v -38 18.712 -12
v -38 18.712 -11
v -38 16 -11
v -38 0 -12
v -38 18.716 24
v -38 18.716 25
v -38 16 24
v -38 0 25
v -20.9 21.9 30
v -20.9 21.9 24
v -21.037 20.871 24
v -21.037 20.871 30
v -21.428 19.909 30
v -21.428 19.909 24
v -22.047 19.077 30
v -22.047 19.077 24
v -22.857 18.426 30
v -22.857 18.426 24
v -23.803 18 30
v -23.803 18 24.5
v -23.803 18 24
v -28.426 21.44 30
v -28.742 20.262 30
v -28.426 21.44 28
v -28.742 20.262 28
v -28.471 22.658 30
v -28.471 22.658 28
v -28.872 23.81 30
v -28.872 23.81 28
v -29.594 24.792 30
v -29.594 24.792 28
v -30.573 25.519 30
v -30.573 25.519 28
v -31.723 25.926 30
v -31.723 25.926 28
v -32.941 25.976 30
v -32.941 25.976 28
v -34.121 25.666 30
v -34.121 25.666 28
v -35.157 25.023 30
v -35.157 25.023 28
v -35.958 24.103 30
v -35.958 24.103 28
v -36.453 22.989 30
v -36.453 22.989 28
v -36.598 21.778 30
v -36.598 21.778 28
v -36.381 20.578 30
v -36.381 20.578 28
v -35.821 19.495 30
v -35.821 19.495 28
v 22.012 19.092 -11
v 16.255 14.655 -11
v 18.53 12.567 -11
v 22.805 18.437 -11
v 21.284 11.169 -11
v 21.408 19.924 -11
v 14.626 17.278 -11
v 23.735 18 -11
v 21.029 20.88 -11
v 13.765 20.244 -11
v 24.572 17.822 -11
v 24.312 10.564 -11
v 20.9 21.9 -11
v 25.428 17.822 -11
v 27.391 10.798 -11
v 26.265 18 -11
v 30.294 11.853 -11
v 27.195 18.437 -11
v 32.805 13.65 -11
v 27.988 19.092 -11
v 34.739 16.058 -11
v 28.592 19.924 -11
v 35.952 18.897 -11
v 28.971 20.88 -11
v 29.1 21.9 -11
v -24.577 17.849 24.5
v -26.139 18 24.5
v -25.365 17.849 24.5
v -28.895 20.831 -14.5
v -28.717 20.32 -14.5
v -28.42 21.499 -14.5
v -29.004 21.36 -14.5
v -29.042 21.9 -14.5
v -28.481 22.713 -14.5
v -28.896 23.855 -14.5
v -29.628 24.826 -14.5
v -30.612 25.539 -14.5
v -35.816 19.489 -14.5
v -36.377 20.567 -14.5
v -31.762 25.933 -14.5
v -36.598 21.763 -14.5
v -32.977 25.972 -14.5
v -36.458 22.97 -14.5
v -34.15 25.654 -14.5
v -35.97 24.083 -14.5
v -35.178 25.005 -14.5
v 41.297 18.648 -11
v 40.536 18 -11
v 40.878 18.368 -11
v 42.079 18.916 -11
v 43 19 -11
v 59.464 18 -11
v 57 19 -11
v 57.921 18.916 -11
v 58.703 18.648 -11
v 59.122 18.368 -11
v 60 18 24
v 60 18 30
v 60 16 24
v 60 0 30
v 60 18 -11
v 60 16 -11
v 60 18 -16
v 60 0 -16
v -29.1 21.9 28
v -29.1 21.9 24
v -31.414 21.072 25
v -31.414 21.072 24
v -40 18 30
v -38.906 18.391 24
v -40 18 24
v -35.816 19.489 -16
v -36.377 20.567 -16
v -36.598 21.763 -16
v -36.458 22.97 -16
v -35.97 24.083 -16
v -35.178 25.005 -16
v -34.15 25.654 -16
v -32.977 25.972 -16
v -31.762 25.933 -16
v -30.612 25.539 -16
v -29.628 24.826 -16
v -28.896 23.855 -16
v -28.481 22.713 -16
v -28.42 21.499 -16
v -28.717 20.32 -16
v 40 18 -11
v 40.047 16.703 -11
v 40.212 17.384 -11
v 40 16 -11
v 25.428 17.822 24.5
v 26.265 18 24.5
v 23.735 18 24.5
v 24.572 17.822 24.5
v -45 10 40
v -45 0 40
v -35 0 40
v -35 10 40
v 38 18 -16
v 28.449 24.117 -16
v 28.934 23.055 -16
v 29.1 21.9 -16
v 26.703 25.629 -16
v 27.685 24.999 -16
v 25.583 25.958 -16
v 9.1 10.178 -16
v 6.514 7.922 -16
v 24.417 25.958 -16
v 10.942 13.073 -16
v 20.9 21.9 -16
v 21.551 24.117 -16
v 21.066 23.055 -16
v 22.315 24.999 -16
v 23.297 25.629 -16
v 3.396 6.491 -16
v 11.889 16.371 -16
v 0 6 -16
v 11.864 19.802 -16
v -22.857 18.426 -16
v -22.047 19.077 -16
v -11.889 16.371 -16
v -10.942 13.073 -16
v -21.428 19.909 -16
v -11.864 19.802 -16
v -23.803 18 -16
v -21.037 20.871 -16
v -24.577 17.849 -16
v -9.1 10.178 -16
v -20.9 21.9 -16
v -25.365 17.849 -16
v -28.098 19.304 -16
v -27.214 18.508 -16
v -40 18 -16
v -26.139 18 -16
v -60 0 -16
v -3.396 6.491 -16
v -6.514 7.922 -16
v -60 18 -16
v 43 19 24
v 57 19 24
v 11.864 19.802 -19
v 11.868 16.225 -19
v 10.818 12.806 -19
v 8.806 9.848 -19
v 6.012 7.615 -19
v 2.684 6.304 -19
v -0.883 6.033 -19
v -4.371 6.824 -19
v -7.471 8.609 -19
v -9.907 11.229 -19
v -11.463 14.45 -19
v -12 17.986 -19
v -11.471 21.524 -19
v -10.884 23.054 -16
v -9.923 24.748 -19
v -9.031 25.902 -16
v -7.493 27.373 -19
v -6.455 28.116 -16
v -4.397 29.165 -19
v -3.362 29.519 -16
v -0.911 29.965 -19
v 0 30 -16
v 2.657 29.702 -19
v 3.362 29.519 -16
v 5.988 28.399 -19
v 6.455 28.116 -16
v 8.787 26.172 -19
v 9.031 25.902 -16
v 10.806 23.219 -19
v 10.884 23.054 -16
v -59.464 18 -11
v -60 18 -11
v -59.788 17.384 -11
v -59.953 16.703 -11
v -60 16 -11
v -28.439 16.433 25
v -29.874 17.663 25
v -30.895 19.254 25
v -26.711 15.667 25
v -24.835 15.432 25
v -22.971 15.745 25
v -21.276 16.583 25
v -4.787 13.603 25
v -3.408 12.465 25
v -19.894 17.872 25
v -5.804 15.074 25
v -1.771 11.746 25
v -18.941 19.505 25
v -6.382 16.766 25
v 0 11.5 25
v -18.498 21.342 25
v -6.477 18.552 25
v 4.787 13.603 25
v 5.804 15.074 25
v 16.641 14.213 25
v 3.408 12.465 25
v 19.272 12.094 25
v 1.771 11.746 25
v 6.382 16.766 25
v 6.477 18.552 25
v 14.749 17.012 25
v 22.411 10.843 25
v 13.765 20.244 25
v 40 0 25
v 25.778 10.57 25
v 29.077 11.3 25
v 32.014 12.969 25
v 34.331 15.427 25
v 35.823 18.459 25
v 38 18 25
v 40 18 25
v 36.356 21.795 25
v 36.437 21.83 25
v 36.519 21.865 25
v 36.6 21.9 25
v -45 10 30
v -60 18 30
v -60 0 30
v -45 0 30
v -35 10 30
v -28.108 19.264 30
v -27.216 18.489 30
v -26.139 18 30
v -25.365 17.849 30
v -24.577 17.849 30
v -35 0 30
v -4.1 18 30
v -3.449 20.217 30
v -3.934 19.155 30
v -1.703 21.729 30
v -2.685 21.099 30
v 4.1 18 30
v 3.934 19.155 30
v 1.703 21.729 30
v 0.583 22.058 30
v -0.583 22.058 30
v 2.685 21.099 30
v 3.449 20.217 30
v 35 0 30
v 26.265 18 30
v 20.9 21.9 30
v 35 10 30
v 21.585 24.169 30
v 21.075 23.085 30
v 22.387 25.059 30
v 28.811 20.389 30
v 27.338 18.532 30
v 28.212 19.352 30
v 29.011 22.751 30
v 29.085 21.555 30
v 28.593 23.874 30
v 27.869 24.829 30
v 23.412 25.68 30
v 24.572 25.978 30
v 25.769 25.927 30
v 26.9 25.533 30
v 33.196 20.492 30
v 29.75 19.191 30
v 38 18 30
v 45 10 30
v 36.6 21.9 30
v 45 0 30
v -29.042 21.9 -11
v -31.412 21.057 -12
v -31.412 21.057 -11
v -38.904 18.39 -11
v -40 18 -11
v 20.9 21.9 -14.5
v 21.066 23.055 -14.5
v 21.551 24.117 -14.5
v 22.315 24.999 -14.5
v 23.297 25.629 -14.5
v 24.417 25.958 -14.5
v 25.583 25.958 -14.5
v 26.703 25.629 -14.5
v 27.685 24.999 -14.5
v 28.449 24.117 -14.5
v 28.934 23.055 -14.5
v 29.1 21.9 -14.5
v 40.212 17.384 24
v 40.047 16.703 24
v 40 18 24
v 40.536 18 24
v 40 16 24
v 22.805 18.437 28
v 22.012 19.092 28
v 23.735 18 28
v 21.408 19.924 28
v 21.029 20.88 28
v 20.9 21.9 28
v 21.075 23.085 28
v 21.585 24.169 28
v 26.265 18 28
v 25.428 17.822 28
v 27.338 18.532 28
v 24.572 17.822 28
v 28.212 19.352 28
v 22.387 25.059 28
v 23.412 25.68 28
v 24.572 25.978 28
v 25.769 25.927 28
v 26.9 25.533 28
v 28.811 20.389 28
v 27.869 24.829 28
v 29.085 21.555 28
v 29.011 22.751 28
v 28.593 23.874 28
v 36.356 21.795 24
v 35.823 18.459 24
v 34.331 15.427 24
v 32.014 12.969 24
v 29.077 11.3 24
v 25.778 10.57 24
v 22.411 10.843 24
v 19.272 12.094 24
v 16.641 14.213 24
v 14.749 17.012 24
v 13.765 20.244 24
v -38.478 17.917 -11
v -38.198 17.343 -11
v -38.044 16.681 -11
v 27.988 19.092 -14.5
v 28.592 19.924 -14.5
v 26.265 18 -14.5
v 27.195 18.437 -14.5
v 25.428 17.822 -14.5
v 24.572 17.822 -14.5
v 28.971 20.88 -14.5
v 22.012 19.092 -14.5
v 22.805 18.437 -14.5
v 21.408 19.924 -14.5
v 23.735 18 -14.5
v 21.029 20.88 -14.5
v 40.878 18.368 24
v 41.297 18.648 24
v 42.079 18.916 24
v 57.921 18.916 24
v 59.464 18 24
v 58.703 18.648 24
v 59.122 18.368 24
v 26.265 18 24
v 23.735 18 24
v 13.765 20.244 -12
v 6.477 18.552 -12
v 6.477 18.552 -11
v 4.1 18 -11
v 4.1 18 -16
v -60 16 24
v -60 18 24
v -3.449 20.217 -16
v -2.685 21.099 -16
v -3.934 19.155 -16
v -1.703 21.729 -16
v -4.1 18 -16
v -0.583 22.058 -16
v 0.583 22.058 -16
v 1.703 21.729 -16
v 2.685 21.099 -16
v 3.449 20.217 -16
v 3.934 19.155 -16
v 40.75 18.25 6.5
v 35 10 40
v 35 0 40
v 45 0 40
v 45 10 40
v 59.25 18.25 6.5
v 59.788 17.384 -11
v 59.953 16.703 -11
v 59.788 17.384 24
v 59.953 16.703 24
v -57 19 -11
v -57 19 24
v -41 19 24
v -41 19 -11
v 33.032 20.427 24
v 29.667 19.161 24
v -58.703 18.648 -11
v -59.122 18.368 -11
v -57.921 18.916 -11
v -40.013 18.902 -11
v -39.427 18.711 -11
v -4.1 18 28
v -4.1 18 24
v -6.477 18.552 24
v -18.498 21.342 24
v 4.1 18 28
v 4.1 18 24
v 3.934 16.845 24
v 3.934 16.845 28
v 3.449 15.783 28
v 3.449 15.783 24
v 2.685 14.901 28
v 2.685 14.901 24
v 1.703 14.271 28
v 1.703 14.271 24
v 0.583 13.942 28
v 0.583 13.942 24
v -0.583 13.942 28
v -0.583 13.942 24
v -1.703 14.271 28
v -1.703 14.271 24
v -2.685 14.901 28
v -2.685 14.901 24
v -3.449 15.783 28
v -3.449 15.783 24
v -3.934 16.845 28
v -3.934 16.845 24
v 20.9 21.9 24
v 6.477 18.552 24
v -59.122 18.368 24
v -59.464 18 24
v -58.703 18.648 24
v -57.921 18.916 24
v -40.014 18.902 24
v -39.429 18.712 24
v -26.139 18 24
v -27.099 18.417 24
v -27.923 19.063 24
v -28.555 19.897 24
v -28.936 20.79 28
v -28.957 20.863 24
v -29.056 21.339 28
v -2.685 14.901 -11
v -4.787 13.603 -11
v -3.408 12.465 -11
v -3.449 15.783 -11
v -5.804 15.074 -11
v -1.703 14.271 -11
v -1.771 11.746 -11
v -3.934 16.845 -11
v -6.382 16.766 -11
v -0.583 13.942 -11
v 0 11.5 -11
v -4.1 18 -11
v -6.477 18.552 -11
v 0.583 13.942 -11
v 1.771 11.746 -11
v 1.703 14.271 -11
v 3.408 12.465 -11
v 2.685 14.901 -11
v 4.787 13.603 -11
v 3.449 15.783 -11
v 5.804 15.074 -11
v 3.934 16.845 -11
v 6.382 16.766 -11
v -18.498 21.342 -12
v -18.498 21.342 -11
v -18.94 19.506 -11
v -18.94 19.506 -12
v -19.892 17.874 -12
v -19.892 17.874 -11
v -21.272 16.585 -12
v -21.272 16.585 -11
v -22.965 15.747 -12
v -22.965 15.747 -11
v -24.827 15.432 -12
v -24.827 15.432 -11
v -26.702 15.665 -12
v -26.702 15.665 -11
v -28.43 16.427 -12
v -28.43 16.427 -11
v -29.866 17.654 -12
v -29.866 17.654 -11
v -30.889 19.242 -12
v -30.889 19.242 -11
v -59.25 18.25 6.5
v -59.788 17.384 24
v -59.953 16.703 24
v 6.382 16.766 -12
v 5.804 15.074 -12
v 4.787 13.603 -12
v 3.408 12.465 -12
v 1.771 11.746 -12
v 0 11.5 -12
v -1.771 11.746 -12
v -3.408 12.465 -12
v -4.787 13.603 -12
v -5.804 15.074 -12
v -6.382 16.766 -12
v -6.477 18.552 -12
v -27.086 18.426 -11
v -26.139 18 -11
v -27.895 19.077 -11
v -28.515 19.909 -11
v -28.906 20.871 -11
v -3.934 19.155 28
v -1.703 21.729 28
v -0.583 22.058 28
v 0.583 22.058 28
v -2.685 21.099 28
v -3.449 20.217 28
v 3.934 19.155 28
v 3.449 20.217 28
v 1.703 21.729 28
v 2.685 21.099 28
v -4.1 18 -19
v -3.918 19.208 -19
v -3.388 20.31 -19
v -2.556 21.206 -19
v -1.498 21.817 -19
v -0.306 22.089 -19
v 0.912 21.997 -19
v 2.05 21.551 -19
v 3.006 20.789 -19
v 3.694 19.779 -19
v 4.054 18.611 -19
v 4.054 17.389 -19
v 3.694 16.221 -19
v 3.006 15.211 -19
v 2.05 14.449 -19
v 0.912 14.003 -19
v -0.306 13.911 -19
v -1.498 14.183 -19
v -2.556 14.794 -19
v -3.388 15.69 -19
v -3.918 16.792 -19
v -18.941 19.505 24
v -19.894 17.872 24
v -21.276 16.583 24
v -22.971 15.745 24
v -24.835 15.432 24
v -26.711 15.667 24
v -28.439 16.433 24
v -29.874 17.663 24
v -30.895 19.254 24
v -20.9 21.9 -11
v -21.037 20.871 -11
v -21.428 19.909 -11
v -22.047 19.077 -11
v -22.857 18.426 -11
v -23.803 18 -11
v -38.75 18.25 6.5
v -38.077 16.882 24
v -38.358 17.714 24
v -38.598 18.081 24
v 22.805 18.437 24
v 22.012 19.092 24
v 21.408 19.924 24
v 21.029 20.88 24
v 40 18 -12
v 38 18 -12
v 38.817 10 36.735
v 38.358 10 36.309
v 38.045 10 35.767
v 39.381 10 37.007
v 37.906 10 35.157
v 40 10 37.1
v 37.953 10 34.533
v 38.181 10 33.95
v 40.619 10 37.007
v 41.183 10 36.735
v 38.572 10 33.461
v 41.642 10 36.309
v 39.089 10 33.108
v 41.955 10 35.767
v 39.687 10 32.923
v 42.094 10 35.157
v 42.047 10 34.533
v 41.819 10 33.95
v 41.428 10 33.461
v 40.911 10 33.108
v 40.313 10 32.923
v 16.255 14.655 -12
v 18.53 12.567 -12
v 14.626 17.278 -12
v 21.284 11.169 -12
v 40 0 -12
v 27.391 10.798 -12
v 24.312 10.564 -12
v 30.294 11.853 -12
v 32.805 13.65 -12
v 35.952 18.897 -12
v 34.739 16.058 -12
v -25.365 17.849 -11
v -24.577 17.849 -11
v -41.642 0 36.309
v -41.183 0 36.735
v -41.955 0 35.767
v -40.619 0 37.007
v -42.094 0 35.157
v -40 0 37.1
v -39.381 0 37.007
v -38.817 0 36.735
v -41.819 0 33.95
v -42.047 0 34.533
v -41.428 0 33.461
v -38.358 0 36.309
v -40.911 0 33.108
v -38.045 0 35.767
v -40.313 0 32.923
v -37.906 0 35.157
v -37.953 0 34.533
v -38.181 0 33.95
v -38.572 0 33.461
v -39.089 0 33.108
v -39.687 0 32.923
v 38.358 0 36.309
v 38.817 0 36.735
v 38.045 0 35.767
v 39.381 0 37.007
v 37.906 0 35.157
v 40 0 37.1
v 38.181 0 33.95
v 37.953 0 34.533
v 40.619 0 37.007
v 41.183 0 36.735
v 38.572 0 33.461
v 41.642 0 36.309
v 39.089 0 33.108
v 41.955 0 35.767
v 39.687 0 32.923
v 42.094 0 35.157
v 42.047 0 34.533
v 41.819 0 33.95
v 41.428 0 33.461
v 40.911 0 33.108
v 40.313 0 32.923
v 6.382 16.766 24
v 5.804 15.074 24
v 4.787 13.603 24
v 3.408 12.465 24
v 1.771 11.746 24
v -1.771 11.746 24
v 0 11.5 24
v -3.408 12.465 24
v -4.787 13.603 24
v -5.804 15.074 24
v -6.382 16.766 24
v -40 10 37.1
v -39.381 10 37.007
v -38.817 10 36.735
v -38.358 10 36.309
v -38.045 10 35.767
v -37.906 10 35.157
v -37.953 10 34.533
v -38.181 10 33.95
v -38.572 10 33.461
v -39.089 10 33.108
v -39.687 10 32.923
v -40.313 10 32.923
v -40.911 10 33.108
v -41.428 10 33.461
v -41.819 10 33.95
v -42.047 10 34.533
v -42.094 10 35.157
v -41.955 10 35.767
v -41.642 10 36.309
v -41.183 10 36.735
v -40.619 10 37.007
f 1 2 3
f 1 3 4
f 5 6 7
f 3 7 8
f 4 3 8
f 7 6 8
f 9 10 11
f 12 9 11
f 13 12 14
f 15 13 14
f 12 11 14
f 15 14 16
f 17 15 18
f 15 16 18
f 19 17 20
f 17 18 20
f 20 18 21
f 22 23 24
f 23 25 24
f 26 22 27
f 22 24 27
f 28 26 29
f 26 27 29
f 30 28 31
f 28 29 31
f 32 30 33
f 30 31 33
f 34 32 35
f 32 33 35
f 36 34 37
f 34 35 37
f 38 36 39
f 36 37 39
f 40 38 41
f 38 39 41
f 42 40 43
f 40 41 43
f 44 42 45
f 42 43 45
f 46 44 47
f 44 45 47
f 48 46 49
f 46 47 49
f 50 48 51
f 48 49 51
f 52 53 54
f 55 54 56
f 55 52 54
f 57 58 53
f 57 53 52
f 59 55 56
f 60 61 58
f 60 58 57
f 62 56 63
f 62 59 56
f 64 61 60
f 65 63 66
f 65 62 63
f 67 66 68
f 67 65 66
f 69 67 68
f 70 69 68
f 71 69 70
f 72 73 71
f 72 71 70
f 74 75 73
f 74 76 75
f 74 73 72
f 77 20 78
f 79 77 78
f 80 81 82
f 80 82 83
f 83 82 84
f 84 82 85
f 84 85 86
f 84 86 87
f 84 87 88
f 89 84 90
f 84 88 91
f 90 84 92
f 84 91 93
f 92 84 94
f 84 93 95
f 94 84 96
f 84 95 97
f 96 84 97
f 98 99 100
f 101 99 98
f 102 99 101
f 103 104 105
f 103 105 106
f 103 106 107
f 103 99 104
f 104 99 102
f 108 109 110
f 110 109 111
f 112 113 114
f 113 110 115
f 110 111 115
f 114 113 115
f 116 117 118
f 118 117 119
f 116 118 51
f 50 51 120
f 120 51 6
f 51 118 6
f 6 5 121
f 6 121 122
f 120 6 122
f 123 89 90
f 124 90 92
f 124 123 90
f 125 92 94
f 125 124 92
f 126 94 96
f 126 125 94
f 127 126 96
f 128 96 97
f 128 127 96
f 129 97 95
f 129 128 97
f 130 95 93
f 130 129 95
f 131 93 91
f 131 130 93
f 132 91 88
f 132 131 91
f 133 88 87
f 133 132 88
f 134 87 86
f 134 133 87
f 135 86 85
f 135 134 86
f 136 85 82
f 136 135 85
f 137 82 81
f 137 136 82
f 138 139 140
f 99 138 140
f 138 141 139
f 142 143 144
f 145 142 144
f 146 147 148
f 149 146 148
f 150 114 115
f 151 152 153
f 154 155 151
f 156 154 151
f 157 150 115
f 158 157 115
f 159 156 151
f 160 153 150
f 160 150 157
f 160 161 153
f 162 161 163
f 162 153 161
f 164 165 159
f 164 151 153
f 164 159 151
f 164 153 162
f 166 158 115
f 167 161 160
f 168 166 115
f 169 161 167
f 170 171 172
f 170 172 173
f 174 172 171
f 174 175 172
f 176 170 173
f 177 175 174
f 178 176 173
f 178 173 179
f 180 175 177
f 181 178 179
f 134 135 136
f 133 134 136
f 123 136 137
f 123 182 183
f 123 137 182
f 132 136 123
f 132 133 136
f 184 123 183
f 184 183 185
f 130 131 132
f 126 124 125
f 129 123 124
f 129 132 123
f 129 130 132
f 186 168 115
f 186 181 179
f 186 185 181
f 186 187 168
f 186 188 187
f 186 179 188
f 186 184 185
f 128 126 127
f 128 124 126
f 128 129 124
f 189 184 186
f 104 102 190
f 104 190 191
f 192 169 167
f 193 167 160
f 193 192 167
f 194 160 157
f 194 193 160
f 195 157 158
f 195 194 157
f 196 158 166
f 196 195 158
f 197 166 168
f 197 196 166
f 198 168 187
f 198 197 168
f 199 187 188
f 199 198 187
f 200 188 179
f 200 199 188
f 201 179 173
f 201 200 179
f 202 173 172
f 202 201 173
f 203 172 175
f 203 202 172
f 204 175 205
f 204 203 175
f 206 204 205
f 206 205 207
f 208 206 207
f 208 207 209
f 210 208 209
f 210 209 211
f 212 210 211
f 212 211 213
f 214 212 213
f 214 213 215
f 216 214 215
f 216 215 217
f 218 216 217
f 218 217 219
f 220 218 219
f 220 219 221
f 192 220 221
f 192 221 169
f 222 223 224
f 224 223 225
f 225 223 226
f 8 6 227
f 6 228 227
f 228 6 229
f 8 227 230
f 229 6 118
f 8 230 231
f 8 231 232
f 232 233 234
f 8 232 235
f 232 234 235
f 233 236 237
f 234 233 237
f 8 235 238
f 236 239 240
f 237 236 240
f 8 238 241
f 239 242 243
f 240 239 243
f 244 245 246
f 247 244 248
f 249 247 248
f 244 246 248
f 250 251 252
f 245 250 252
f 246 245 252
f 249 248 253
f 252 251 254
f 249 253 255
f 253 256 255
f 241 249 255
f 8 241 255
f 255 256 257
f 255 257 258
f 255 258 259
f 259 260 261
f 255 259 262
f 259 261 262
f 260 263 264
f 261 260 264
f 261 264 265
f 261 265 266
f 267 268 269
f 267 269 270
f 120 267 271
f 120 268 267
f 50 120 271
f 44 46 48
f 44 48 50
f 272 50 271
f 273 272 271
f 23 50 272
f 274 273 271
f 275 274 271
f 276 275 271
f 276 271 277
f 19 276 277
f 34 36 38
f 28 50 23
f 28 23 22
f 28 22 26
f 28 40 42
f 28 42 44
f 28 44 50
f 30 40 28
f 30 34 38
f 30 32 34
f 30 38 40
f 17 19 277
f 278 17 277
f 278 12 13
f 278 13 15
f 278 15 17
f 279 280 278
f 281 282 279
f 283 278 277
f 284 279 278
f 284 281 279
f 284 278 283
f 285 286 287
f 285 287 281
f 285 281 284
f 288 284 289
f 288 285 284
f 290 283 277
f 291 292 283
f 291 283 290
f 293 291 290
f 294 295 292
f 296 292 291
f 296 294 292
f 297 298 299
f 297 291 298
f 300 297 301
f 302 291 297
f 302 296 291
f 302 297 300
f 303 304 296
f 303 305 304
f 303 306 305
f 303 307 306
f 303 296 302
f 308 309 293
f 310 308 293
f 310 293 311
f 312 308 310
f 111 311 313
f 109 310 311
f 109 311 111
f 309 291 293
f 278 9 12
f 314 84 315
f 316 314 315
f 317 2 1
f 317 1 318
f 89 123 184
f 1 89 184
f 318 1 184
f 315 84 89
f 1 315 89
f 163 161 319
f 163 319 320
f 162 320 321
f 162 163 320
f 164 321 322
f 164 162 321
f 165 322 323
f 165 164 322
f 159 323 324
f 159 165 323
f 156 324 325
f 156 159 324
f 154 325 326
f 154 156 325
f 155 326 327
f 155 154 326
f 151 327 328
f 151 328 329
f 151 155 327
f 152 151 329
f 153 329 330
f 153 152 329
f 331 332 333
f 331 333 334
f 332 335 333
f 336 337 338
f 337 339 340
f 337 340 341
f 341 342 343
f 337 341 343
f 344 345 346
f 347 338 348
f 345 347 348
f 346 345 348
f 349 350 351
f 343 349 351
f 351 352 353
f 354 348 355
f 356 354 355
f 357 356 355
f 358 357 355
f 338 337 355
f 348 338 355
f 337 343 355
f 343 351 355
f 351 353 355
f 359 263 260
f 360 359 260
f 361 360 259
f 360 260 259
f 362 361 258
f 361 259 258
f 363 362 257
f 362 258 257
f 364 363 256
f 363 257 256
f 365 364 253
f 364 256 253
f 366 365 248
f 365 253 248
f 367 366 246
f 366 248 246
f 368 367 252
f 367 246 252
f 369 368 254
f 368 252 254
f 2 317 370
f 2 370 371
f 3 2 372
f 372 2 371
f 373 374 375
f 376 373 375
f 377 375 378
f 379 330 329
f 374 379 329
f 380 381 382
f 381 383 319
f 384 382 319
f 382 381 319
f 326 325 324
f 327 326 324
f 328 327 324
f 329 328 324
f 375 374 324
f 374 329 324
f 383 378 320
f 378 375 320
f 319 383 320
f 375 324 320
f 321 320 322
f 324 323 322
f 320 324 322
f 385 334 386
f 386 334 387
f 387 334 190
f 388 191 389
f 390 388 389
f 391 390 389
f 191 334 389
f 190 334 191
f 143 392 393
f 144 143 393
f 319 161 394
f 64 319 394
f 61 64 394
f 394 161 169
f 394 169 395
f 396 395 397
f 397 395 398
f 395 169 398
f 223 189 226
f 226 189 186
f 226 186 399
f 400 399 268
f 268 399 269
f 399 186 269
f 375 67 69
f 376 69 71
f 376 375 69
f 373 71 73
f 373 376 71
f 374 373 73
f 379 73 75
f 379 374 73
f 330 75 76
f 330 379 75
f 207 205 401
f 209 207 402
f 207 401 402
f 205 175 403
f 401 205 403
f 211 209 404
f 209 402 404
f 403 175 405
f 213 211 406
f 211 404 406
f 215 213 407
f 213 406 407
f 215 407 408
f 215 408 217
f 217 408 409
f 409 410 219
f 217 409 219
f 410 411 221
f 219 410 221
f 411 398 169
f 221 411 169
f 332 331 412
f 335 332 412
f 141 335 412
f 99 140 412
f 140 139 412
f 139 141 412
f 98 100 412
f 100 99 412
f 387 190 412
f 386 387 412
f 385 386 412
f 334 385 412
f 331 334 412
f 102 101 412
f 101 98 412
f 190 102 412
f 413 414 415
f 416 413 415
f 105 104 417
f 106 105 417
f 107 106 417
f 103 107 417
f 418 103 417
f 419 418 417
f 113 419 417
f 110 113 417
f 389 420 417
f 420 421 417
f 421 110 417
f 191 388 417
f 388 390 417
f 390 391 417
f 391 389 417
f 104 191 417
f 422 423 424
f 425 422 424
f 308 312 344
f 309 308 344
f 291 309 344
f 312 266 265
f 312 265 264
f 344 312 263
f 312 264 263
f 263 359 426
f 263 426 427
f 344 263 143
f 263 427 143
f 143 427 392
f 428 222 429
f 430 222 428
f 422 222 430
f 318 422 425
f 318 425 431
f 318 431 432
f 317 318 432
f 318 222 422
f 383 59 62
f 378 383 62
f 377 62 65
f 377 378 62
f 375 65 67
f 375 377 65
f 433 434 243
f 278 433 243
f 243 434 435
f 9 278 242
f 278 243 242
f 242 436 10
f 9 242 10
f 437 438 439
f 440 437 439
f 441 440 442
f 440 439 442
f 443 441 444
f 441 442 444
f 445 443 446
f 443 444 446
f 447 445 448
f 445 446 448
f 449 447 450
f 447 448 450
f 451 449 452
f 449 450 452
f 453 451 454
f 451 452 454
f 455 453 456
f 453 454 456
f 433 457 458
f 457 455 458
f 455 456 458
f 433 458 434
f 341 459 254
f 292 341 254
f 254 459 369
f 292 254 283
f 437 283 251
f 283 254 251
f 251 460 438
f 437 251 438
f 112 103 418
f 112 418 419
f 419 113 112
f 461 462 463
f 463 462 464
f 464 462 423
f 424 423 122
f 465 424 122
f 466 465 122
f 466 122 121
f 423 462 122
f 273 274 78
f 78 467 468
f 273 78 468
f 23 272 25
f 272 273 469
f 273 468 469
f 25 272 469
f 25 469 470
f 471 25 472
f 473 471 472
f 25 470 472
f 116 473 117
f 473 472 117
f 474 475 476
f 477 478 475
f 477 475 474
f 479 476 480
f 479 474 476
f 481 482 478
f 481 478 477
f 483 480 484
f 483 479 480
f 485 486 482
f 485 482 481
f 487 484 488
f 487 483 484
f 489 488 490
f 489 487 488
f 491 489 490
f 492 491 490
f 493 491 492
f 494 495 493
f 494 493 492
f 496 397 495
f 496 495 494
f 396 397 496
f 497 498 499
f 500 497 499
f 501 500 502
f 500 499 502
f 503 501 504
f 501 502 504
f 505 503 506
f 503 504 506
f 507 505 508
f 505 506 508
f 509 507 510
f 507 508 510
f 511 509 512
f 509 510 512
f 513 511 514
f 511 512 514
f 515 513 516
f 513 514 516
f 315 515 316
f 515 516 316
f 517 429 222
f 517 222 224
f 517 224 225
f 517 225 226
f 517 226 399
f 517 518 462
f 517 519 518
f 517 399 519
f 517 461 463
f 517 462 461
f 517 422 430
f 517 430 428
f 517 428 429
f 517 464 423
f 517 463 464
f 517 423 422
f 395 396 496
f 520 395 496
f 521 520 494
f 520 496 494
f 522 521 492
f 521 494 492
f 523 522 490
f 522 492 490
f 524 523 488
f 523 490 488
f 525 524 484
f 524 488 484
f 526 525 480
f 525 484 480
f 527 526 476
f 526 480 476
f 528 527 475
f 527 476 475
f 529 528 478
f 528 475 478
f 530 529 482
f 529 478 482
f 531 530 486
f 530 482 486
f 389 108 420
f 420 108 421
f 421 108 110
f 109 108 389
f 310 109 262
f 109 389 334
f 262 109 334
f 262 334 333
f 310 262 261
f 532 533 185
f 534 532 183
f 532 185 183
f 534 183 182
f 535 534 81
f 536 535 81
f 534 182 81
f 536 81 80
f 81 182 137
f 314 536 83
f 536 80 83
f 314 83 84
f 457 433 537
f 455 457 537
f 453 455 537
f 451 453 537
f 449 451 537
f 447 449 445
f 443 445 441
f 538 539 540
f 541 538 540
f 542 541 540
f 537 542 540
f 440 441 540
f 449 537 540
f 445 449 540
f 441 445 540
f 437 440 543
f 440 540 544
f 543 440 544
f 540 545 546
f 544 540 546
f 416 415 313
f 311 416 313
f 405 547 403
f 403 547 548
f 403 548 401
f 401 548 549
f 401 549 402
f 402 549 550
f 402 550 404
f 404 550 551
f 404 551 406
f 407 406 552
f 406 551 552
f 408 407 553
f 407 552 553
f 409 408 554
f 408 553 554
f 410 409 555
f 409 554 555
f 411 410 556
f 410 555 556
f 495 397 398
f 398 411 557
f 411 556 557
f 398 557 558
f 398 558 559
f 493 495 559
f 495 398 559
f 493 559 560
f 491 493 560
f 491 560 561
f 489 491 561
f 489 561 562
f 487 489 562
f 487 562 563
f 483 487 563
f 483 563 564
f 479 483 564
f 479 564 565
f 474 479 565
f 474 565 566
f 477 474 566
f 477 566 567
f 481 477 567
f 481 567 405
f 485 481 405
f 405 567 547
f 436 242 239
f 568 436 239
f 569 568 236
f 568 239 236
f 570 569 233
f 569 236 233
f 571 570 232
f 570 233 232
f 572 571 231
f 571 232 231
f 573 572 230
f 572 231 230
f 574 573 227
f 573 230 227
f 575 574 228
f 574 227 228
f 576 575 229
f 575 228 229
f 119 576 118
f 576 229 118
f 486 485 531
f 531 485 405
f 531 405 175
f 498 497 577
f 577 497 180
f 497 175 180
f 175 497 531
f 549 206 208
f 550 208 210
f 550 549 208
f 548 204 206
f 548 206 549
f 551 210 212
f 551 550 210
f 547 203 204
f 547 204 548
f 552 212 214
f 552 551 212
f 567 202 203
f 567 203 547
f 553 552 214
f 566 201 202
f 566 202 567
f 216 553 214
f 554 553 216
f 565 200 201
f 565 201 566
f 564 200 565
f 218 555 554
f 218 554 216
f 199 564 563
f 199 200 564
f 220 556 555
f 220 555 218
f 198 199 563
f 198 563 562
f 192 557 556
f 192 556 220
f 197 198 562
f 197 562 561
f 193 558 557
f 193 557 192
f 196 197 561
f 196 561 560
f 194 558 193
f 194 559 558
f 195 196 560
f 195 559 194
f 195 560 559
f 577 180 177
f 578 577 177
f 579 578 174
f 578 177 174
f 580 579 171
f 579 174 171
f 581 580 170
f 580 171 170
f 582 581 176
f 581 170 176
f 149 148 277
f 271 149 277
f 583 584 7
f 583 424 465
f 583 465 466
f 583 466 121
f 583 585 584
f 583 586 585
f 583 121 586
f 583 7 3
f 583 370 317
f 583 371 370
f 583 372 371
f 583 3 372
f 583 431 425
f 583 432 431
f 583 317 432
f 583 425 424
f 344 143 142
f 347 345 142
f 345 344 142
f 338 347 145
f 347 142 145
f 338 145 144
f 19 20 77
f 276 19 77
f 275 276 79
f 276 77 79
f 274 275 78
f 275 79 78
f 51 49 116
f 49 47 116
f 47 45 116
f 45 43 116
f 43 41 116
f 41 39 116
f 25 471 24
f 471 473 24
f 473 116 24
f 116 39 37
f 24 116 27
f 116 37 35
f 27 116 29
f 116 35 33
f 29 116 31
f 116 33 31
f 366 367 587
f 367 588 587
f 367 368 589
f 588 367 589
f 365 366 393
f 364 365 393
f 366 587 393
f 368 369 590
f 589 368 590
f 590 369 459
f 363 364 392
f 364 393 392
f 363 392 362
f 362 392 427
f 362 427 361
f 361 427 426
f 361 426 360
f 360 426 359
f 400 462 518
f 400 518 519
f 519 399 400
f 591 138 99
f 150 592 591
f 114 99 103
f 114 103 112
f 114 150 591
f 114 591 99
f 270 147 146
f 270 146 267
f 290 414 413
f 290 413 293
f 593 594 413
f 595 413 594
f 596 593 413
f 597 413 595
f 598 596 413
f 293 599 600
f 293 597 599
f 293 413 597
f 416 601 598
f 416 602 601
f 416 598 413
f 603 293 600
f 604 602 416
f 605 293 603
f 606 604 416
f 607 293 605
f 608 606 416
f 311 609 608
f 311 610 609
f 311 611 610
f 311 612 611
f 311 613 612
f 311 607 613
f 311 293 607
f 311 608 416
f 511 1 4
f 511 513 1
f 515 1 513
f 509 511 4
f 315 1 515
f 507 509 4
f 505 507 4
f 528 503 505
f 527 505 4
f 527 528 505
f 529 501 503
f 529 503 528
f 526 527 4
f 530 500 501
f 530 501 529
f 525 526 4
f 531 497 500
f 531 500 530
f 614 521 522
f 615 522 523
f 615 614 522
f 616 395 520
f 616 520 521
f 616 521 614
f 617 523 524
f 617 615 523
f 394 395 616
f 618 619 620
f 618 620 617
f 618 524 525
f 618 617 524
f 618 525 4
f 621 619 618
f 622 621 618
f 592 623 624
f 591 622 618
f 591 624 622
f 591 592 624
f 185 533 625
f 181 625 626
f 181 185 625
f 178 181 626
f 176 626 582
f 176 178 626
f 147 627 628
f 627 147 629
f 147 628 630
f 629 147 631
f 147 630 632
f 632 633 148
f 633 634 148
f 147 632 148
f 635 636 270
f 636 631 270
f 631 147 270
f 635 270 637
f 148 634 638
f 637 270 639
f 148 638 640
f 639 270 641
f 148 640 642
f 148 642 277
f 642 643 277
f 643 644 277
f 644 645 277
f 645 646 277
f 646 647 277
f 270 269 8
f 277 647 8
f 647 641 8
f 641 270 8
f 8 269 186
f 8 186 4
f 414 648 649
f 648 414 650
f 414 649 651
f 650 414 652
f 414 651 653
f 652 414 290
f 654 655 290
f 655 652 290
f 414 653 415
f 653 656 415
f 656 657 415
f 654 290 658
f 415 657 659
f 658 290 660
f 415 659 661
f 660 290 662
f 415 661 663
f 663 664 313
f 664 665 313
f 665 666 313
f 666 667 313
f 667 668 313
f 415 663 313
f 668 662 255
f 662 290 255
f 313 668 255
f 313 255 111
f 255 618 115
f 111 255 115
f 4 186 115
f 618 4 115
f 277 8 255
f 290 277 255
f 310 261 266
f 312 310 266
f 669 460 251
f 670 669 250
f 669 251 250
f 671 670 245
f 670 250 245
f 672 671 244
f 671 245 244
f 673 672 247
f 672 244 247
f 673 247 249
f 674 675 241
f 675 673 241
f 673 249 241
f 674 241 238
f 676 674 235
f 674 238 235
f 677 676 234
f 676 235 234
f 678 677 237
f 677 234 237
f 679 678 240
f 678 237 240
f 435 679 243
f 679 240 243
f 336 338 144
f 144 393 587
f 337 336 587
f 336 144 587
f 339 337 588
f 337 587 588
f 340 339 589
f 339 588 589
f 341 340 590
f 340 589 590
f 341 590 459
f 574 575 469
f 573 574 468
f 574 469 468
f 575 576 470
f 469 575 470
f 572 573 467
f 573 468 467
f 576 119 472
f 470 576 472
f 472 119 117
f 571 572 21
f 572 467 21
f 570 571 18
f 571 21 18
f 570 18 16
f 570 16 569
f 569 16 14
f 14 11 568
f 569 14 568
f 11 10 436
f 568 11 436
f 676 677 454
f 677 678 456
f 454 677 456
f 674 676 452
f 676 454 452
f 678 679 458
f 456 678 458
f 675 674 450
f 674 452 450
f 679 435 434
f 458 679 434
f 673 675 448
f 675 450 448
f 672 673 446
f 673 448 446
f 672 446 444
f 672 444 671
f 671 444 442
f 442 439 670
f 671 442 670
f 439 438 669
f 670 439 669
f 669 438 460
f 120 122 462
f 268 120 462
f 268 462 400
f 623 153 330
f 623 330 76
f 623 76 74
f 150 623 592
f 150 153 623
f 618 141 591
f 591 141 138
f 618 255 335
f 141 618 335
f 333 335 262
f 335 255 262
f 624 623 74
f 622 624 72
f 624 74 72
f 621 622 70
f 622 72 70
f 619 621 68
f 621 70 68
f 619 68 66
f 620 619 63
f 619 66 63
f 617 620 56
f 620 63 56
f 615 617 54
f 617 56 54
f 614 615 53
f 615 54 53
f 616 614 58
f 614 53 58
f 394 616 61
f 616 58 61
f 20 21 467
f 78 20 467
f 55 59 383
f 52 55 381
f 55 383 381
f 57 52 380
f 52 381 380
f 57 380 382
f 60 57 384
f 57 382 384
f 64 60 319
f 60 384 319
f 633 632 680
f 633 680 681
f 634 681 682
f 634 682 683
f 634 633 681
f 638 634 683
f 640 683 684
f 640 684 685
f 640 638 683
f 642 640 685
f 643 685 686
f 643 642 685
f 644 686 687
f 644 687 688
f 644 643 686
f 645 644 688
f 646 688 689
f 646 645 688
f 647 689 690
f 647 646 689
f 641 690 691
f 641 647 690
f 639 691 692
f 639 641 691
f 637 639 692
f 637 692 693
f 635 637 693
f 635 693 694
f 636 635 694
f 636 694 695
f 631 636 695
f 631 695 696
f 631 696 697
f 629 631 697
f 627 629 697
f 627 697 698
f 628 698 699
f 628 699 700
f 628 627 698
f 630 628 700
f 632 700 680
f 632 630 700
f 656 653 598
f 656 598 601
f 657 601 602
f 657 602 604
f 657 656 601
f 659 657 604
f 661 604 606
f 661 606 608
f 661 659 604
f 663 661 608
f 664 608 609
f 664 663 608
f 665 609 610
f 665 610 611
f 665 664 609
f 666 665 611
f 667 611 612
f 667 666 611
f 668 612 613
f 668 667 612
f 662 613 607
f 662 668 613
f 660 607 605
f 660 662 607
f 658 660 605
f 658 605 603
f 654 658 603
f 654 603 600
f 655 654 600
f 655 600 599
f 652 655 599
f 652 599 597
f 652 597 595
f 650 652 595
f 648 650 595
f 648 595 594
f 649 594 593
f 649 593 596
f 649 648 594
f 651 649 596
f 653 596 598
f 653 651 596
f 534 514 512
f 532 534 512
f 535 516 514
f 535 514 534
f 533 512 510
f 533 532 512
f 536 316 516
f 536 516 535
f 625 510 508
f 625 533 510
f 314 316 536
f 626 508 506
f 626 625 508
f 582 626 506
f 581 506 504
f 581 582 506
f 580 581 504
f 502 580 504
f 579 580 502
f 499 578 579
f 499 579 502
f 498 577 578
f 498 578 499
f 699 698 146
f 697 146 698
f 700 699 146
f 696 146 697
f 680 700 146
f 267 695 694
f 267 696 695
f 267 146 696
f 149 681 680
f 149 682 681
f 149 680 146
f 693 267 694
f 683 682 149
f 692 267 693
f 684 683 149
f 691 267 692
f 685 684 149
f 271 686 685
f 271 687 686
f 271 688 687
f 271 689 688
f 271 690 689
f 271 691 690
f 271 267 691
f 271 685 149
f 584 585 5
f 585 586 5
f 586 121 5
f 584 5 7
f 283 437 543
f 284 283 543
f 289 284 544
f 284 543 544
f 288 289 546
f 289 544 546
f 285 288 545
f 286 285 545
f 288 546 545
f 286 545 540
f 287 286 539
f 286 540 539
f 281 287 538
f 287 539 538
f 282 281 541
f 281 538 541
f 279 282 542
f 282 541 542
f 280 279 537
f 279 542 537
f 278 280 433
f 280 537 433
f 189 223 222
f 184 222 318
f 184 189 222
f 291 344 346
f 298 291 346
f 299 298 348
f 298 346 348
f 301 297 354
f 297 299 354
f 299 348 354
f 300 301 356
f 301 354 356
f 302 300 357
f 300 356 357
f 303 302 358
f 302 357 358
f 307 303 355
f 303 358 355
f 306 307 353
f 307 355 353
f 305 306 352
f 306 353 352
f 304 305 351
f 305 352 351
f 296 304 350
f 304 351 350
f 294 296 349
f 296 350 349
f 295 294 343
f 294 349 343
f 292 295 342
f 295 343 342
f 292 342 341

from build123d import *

# Parameters (mm, degrees)
SKETCH_1_5_W             = 10
SKETCH_1_5_H             = 10
SKETCH_1_5_R             = 2.1
EXTRUDE_4_DEPTH          = 10
EXTRUDE_4_2_DEPTH        = 10
SKETCH_1_6_W             = 10
SKETCH_1_6_H             = 10
SKETCH_1_6_R             = 2.1
EXTRUDE_5_DEPTH          = 35
SKETCH_1_W               = 20
SKETCH_1_H               = 35
EXTRUDE_7_DEPTH          = 19
SKETCH_1_W_2             = 22
EXTRUDE_7_2_DEPTH        = 19
FILLET_8_SIZE            = 3
FILLET_9_SIZE            = 3
EXTRUDE_8_DEPTH          = 18
SKETCH_2_W               = 37
SKETCH_2_H               = 30
CUT_EXTRUDE_2_DEPTH      = 138.800580637
CUT_EXTRUDE_3_DEPTH      = 113.111551644
CUT_EXTRUDE_3_DEPTH_BACK = 113.111551644
CUT_EXTRUDE_4_DEPTH      = 6
CUT_EXTRUDE_START        = -5.5
CUT_EXTRUDE_5_DEPTH      = 5.5
EXTRUDE_START            = 24
EXTRUDE_14_DEPTH         = 6
EXTRUDE_15_DEPTH         = 5
CUT_EXTRUDE_6_DEPTH      = 138.800580637
CUT_EXTRUDE_6_DEPTH_BACK = 138.800580637
EXTRUDE_START_2          = -2
SKETCH_10_R              = 4.1
EXTRUDE_17_DEPTH         = 2
SKETCH_11_R              = 4.1
EXTRUDE_18_DEPTH         = 1.5
EXTRUDE_19_DEPTH         = 6
CUT_EXTRUDE_7_DEPTH      = 36
CUT_EXTRUDE_7_DEPTH_BACK = 1
EXTRUDE_START_3          = 3
SKETCH_13_R              = 12
SKETCH_13_R_2            = 4.1
EXTRUDE_20_DEPTH         = 3
CUT_EXTRUDE_9_DEPTH      = 40


with BuildPart() as part:
    # Эскиз1<5> → Бобышка-Вытянуть4 (new body)
    with BuildSketch(Plane(origin=(0, 0, 0), x_dir=(1, 0, 0), z_dir=(0, 1, 0))):
        with Locations((-40, -35)):
            Rectangle(SKETCH_1_5_W, SKETCH_1_5_H)
        with Locations(Location((-40, -35, 0), (0, 0, 270))):
            Circle(SKETCH_1_5_R, mode=Mode.SUBTRACT)
    extrude(amount=EXTRUDE_4_DEPTH)



with BuildPart() as body_2:
    # Эскиз1<5> → Extrude 4 2 (new body)
    with BuildSketch(Plane(origin=(0, 0, 0), x_dir=(1, 0, 0), z_dir=(0, 1, 0))):
        with Locations((40, -35)):
            Rectangle(SKETCH_1_5_W, SKETCH_1_5_H)
        with Locations(Location((40, -35, 0), (0, 0, 270))):
            Circle(SKETCH_1_5_R, mode=Mode.SUBTRACT)
    extrude(amount=EXTRUDE_4_2_DEPTH)


with BuildPart() as body_3:
    # Эскиз1<6> → Бобышка-Вытянуть5 (new body)
    # profile 1 of 3: a face of its own
    with BuildSketch(Plane(origin=(0, 0, 0), x_dir=(1, 0, 0), z_dir=(0, 1, 0))):
        Polygon((45, 48), (35, 48), (-35, 48), (-45, 48), (-60, 48), (-60, 43), (-60, 16), (-55, 16), (-55, 43), (55, 43), (55, 16), (60, 16), (60, 43), (60, 48), align=None)
    # profile 2 of 3: a face of its own
    with BuildSketch(Plane(origin=(0, 0, 0), x_dir=(1, 0, 0), z_dir=(0, 1, 0))):
        with Locations((-40, 53)):
            Rectangle(SKETCH_1_6_W, SKETCH_1_6_H)
        with Locations(Location((-40, 53, 0), (0, 0, 270))):
            Circle(SKETCH_1_6_R, mode=Mode.SUBTRACT)
    # profile 3 of 3: a face of its own
    with BuildSketch(Plane(origin=(0, 0, 0), x_dir=(1, 0, 0), z_dir=(0, 1, 0))):
        with Locations((40, 53)):
            Rectangle(SKETCH_1_6_W, SKETCH_1_6_H)
        with Locations(Location((40, 53, 0), (0, 0, 270))):
            Circle(SKETCH_1_6_R, mode=Mode.SUBTRACT)
    extrude(amount=EXTRUDE_5_DEPTH)


with BuildPart() as body_4:
    # Эскиз1 → Бобышка-Вытянуть7 (new body)
    with BuildSketch(Plane(origin=(0, 0, 0), x_dir=(1, 0, 0), z_dir=(0, 1, 0))):
        with Locations((50, -6.5)):
            Rectangle(SKETCH_1_W, SKETCH_1_H)
    extrude(amount=EXTRUDE_7_DEPTH)

    # Скругление9
    # a fillet whose section is not a circle: 3 mm, written as the material it takes off along each edge
    with BuildSketch(Plane(origin=(40, 19, 31.5), x_dir=(0, -1, 0), z_dir=(0, 0, -1)), Plane(origin=(60, 19, -18.5), x_dir=(0, -1, 0), z_dir=(0, 0, 1))) as fillet_9_piece_1:
        with BuildLine():
            Bezier((FILLET_9_SIZE, 0), (0, 0), (0, -FILLET_9_SIZE), weights=[1, 1, 1])
            Line((0, -FILLET_9_SIZE), (0, 0))
            Line((0, 0), (FILLET_9_SIZE, 0))
        make_face()
    extrude(amount=50, mode=Mode.SUBTRACT)


with BuildPart() as body_5:
    # Эскиз1 → Extrude 7 2 (new body)
    with BuildSketch(Plane(origin=(0, 0, 0), x_dir=(1, 0, 0), z_dir=(0, 1, 0))):
        with Locations((-49, -6.5)):
            Rectangle(SKETCH_1_W_2, SKETCH_1_H)
    extrude(amount=EXTRUDE_7_2_DEPTH)

    # Скругление8
    # a fillet whose section is not a circle: 3 mm, written as the material it takes off along each edge
    with BuildSketch(Plane(origin=(-60, 19, -18.5), x_dir=(0, -1, 0), z_dir=(0, 0, 1)), Plane(origin=(-38, 19, 31.5), x_dir=(0, -1, 0), z_dir=(0, 0, -1))) as fillet_8_piece_1:
        with BuildLine():
            Bezier((FILLET_8_SIZE, 0), (0, 0), (0, FILLET_8_SIZE), weights=[1, 1, 1])
            Line((0, FILLET_8_SIZE), (0, 0))
            Line((0, 0), (FILLET_8_SIZE, 0))
        make_face()
    extrude(amount=50, mode=Mode.SUBTRACT)


with BuildPart() as part_1:
    add(part.part)

    add(body_2.part)  # Бобышка-Вытянуть8 merges body 2

    add(body_3.part)  # Бобышка-Вытянуть8 merges body 3

    add(body_4.part)  # Бобышка-Вытянуть8 merges body 4

    add(body_5.part)  # Бобышка-Вытянуть8 merges body 5
    # Эскиз1<9> → Бобышка-Вытянуть8 (add)
    with BuildSketch(Plane(origin=(0, 0, 0), x_dir=(1, 0, 0), z_dir=(0, 1, 0))):
        Polygon((-38, 11), (40, 11), (60, 11), (60, 16), (55, 16), (-55, 16), (-60, 16), (-60, 11), align=None)
        Polygon((40, -24), (60, -24), (60, -30), (45, -30), (35, -30), (-35, -30), (-45, -30), (-60, -30), (-60, -24), (-38, -24), align=None)
    extrude(amount=EXTRUDE_8_DEPTH)

    # Эскиз2 → Вырез-Вытянуть2 (cut, through all)
    with BuildSketch(Plane.ZY.offset(60)):
        with Locations((-39.5, 15)):
            Rectangle(SKETCH_2_W, SKETCH_2_H)
    extrude(amount=-CUT_EXTRUDE_2_DEPTH, mode=Mode.SUBTRACT)

    # Эскиз3 → Вырез-Вытянуть3 (cut, two sides: drawn at the far end of the back side and taken through both)
    with BuildSketch(Plane.XY.offset(30).offset(-CUT_EXTRUDE_3_DEPTH_BACK)):
        with BuildLine():
            Line((-4.1, 18), (4.1, 18))
            ThreePointArc((4.1, 18), (0, 13.9), (-4.1, 18))
        make_face()
    extrude(amount=CUT_EXTRUDE_3_DEPTH + CUT_EXTRUDE_3_DEPTH_BACK, mode=Mode.SUBTRACT)

    # Эскиз6 → Вырез-Вытянуть4 (cut)
    with BuildSketch(Plane(origin=(0, 0, -16), x_dir=(-1, 0, 0), z_dir=(0, 0, -1))):
        with BuildLine():
            Line((-26.264911064, 18), (-23.735088936, 18))
            ThreePointArc((-23.735088936, 18), (-25, 17.8), (-26.264911064, 18))
        make_face()
        with BuildLine():
            Line((23.803098267, 18), (26.13923016, 18))
            ThreePointArc((26.13923016, 18), (24.971164214, 17.830091849), (23.803098267, 18))
        make_face()
    extrude(amount=-CUT_EXTRUDE_4_DEPTH, mode=Mode.SUBTRACT)

    # Эскиз7 → Вырез-Вытянуть5 (cut)
    with BuildSketch(Plane.XY.offset(30).offset(CUT_EXTRUDE_START)):
        with BuildLine():
            Line((-26.13923016, 18), (-23.803098267, 18))
            ThreePointArc((-23.803098267, 18), (-24.971164214, 17.830091849), (-26.13923016, 18))
        make_face()
        with BuildLine():
            Line((23.735088936, 18), (26.264911064, 18))
            ThreePointArc((26.264911064, 18), (25, 17.8), (23.735088936, 18))
        make_face()
    extrude(amount=CUT_EXTRUDE_5_DEPTH, mode=Mode.SUBTRACT)

    # Бобышка-Вытянуть14: read off the stored shape, not the designer's step
    # Бобышка-Вытянуть14 outline → Бобышка-Вытянуть14 (add)
    with BuildSketch(Plane.XY.offset(EXTRUDE_START)):
        with BuildLine():
            ThreePointArc((23.735088935, 18), (21.68366653, 19.489205044), (20.9, 21.9))
            Line((20.9, 21.9), (4.1, 18))
            Line((4.1, 18), (23.735088935, 18))
        make_face()
        with BuildLine():
            ThreePointArc((-20.9, 21.9), (-21.711099928, 19.473259749), (-23.803098267, 18))
            Line((-23.803098267, 18), (-4.1, 18))
            Line((-4.1, 18), (-20.9, 21.9))
        make_face()
        with BuildLine():
            ThreePointArc((-26.13923016, 18), (-28.265749222, 19.45947321), (-29.1, 21.9))
            Line((-29.1, 21.9), (-40, 18))
            Line((-40, 18), (-26.13923016, 18))
        make_face()
    extrude(amount=EXTRUDE_14_DEPTH)

    # Эскиз6<6> → Бобышка-Вытянуть15 (add)
    with BuildSketch(Plane(origin=(0, 0, -16), x_dir=(-1, 0, 0), z_dir=(0, 0, -1))):
        with BuildLine():
            ThreePointArc((-23.735088936, 18), (-21.68366653, 19.489205044), (-20.9, 21.9))
            Line((-20.9, 21.9), (-4.1, 18))
            Line((-4.1, 18), (-23.735088936, 18))
        make_face()
        with BuildLine():
            ThreePointArc((20.9, 21.9), (21.711099928, 19.473259749), (23.803098267, 18))
            Line((23.803098267, 18), (4.1, 18))
            Line((4.1, 18), (20.9, 21.9))
        make_face()
        with BuildLine():
            Line((29.042328427, 21.9), (40, 18))
            Line((40, 18), (26.13923016, 18))
            ThreePointArc((26.13923016, 18), (28.2312285, 19.473259749), (29.042328427, 21.9))
        make_face()
        with BuildLine():
            Line((-38, 18), (-26.264911064, 18))
            ThreePointArc((-26.264911064, 18), (-28.31633347, 19.489205044), (-29.1, 21.9))
            Line((-29.1, 21.9), (-38, 18))
        make_face()
    extrude(amount=-EXTRUDE_15_DEPTH)

    # Эскиз9 → Вырез-Вытянуть6 (cut, two sides: drawn at the far end of the back side and taken through both)
    with BuildSketch(Plane.ZY.offset(60).offset(-CUT_EXTRUDE_6_DEPTH_BACK)):
        Polygon((-58, 34.891965128), (-58, 35), (-16, 35), (-16, 34.9), align=None)
    extrude(amount=CUT_EXTRUDE_6_DEPTH + CUT_EXTRUDE_6_DEPTH_BACK, mode=Mode.SUBTRACT)

    # Эскиз10 → Бобышка-Вытянуть17 (add)
    with BuildSketch(Plane.XY.offset(30).offset(EXTRUDE_START_2)):
        with Locations((25, 21.9)):
            Circle(SKETCH_10_R)
        with Locations((0, 18)):
            Circle(SKETCH_10_R)
        with Locations((-32.5, 21.9)):
            Circle(SKETCH_10_R)
    extrude(amount=EXTRUDE_17_DEPTH)

    # Эскиз11 → Бобышка-Вытянуть18 (add)
    with BuildSketch(Plane(origin=(0, 0, -16), x_dir=(-1, 0, 0), z_dir=(0, 0, -1))):
        with Locations((-25, 21.9)):
            Circle(SKETCH_11_R)
        with Locations((32.5, 21.9)):
            Circle(SKETCH_11_R)
    extrude(amount=-EXTRUDE_18_DEPTH)

    # Бобышка-Вытянуть19: read off the stored shape, not the designer's step
    # Бобышка-Вытянуть19 outline → Бобышка-Вытянуть19 (add)
    with BuildSketch(Plane.XY.offset(EXTRUDE_START)):
        with BuildLine():
            Line((26.264911064, 18), (38, 18))
            Line((38, 18), (36.6, 21.9))
            ThreePointArc((36.6, 21.9), (31.478486585, 19.828016661), (26.264911064, 18))
        make_face()
    extrude(amount=EXTRUDE_19_DEPTH)

    # Эскиз12 → Вырез-Вытянуть7 (cut, two sides: drawn at the far end of the back side and taken through both)
    with BuildSketch(Plane(origin=(0, 0, 24), x_dir=(-1, 0, 0), z_dir=(0, 0, -1)).offset(-CUT_EXTRUDE_7_DEPTH_BACK)):
        with BuildLine():
            Line((-40, 0), (-40, 18))
            Line((-40, 18), (-38, 18))
            Line((-38, 18), (-36.331975313, 22.6466402))
            ThreePointArc((-36.331975313, 22.6466402), (-26.202477843, 10.607295137), (-13.76489452, 20.243636228))
            Line((-13.76489452, 20.243636228), (-6.476544564, 18.551697845))
            ThreePointArc((-6.476544564, 18.551697845), (0, 11.5), (6.476544564, 18.551697845))
            Line((6.476544564, 18.551697845), (18.497791598, 21.342344478))
            ThreePointArc((18.497791598, 21.342344478), (24.835126866, 15.431515556), (31.414269621, 21.071958576))
            Line((31.414269621, 21.071958576), (38, 18.71559633))
            Line((38, 18.71559633), (38, 0))
            Line((38, 0), (-40, 0))
        make_face()
    extrude(amount=CUT_EXTRUDE_7_DEPTH + CUT_EXTRUDE_7_DEPTH_BACK, mode=Mode.SUBTRACT)

    # Эскиз13 → Бобышка-Вытянуть20 (add)
    with BuildSketch(Plane(origin=(0, 0, -16), x_dir=(-1, 0, 0), z_dir=(0, 0, -1)).offset(EXTRUDE_START_3)):
        with Locations(Location((0, 18, 0), (0, 0, 171.361826288))):
            Circle(SKETCH_13_R)
        with Locations((0, 18)):
            Circle(SKETCH_13_R_2, mode=Mode.SUBTRACT)
    extrude(amount=-EXTRUDE_20_DEPTH)

    # Эскиз14 → Вырез-Вытянуть9 (cut)
    with BuildSketch(Plane(origin=(0, 0, 0), x_dir=(-1, 0, 0), z_dir=(0, -1, 0))):
        Polygon((-55, 16), (-55, 43), (55, 43), (55, 16), (60, 16), (60, 63), (-60, 63), (-60, 16), align=None)
    extrude(amount=-CUT_EXTRUDE_9_DEPTH, mode=Mode.SUBTRACT)


solid = part_1.part
